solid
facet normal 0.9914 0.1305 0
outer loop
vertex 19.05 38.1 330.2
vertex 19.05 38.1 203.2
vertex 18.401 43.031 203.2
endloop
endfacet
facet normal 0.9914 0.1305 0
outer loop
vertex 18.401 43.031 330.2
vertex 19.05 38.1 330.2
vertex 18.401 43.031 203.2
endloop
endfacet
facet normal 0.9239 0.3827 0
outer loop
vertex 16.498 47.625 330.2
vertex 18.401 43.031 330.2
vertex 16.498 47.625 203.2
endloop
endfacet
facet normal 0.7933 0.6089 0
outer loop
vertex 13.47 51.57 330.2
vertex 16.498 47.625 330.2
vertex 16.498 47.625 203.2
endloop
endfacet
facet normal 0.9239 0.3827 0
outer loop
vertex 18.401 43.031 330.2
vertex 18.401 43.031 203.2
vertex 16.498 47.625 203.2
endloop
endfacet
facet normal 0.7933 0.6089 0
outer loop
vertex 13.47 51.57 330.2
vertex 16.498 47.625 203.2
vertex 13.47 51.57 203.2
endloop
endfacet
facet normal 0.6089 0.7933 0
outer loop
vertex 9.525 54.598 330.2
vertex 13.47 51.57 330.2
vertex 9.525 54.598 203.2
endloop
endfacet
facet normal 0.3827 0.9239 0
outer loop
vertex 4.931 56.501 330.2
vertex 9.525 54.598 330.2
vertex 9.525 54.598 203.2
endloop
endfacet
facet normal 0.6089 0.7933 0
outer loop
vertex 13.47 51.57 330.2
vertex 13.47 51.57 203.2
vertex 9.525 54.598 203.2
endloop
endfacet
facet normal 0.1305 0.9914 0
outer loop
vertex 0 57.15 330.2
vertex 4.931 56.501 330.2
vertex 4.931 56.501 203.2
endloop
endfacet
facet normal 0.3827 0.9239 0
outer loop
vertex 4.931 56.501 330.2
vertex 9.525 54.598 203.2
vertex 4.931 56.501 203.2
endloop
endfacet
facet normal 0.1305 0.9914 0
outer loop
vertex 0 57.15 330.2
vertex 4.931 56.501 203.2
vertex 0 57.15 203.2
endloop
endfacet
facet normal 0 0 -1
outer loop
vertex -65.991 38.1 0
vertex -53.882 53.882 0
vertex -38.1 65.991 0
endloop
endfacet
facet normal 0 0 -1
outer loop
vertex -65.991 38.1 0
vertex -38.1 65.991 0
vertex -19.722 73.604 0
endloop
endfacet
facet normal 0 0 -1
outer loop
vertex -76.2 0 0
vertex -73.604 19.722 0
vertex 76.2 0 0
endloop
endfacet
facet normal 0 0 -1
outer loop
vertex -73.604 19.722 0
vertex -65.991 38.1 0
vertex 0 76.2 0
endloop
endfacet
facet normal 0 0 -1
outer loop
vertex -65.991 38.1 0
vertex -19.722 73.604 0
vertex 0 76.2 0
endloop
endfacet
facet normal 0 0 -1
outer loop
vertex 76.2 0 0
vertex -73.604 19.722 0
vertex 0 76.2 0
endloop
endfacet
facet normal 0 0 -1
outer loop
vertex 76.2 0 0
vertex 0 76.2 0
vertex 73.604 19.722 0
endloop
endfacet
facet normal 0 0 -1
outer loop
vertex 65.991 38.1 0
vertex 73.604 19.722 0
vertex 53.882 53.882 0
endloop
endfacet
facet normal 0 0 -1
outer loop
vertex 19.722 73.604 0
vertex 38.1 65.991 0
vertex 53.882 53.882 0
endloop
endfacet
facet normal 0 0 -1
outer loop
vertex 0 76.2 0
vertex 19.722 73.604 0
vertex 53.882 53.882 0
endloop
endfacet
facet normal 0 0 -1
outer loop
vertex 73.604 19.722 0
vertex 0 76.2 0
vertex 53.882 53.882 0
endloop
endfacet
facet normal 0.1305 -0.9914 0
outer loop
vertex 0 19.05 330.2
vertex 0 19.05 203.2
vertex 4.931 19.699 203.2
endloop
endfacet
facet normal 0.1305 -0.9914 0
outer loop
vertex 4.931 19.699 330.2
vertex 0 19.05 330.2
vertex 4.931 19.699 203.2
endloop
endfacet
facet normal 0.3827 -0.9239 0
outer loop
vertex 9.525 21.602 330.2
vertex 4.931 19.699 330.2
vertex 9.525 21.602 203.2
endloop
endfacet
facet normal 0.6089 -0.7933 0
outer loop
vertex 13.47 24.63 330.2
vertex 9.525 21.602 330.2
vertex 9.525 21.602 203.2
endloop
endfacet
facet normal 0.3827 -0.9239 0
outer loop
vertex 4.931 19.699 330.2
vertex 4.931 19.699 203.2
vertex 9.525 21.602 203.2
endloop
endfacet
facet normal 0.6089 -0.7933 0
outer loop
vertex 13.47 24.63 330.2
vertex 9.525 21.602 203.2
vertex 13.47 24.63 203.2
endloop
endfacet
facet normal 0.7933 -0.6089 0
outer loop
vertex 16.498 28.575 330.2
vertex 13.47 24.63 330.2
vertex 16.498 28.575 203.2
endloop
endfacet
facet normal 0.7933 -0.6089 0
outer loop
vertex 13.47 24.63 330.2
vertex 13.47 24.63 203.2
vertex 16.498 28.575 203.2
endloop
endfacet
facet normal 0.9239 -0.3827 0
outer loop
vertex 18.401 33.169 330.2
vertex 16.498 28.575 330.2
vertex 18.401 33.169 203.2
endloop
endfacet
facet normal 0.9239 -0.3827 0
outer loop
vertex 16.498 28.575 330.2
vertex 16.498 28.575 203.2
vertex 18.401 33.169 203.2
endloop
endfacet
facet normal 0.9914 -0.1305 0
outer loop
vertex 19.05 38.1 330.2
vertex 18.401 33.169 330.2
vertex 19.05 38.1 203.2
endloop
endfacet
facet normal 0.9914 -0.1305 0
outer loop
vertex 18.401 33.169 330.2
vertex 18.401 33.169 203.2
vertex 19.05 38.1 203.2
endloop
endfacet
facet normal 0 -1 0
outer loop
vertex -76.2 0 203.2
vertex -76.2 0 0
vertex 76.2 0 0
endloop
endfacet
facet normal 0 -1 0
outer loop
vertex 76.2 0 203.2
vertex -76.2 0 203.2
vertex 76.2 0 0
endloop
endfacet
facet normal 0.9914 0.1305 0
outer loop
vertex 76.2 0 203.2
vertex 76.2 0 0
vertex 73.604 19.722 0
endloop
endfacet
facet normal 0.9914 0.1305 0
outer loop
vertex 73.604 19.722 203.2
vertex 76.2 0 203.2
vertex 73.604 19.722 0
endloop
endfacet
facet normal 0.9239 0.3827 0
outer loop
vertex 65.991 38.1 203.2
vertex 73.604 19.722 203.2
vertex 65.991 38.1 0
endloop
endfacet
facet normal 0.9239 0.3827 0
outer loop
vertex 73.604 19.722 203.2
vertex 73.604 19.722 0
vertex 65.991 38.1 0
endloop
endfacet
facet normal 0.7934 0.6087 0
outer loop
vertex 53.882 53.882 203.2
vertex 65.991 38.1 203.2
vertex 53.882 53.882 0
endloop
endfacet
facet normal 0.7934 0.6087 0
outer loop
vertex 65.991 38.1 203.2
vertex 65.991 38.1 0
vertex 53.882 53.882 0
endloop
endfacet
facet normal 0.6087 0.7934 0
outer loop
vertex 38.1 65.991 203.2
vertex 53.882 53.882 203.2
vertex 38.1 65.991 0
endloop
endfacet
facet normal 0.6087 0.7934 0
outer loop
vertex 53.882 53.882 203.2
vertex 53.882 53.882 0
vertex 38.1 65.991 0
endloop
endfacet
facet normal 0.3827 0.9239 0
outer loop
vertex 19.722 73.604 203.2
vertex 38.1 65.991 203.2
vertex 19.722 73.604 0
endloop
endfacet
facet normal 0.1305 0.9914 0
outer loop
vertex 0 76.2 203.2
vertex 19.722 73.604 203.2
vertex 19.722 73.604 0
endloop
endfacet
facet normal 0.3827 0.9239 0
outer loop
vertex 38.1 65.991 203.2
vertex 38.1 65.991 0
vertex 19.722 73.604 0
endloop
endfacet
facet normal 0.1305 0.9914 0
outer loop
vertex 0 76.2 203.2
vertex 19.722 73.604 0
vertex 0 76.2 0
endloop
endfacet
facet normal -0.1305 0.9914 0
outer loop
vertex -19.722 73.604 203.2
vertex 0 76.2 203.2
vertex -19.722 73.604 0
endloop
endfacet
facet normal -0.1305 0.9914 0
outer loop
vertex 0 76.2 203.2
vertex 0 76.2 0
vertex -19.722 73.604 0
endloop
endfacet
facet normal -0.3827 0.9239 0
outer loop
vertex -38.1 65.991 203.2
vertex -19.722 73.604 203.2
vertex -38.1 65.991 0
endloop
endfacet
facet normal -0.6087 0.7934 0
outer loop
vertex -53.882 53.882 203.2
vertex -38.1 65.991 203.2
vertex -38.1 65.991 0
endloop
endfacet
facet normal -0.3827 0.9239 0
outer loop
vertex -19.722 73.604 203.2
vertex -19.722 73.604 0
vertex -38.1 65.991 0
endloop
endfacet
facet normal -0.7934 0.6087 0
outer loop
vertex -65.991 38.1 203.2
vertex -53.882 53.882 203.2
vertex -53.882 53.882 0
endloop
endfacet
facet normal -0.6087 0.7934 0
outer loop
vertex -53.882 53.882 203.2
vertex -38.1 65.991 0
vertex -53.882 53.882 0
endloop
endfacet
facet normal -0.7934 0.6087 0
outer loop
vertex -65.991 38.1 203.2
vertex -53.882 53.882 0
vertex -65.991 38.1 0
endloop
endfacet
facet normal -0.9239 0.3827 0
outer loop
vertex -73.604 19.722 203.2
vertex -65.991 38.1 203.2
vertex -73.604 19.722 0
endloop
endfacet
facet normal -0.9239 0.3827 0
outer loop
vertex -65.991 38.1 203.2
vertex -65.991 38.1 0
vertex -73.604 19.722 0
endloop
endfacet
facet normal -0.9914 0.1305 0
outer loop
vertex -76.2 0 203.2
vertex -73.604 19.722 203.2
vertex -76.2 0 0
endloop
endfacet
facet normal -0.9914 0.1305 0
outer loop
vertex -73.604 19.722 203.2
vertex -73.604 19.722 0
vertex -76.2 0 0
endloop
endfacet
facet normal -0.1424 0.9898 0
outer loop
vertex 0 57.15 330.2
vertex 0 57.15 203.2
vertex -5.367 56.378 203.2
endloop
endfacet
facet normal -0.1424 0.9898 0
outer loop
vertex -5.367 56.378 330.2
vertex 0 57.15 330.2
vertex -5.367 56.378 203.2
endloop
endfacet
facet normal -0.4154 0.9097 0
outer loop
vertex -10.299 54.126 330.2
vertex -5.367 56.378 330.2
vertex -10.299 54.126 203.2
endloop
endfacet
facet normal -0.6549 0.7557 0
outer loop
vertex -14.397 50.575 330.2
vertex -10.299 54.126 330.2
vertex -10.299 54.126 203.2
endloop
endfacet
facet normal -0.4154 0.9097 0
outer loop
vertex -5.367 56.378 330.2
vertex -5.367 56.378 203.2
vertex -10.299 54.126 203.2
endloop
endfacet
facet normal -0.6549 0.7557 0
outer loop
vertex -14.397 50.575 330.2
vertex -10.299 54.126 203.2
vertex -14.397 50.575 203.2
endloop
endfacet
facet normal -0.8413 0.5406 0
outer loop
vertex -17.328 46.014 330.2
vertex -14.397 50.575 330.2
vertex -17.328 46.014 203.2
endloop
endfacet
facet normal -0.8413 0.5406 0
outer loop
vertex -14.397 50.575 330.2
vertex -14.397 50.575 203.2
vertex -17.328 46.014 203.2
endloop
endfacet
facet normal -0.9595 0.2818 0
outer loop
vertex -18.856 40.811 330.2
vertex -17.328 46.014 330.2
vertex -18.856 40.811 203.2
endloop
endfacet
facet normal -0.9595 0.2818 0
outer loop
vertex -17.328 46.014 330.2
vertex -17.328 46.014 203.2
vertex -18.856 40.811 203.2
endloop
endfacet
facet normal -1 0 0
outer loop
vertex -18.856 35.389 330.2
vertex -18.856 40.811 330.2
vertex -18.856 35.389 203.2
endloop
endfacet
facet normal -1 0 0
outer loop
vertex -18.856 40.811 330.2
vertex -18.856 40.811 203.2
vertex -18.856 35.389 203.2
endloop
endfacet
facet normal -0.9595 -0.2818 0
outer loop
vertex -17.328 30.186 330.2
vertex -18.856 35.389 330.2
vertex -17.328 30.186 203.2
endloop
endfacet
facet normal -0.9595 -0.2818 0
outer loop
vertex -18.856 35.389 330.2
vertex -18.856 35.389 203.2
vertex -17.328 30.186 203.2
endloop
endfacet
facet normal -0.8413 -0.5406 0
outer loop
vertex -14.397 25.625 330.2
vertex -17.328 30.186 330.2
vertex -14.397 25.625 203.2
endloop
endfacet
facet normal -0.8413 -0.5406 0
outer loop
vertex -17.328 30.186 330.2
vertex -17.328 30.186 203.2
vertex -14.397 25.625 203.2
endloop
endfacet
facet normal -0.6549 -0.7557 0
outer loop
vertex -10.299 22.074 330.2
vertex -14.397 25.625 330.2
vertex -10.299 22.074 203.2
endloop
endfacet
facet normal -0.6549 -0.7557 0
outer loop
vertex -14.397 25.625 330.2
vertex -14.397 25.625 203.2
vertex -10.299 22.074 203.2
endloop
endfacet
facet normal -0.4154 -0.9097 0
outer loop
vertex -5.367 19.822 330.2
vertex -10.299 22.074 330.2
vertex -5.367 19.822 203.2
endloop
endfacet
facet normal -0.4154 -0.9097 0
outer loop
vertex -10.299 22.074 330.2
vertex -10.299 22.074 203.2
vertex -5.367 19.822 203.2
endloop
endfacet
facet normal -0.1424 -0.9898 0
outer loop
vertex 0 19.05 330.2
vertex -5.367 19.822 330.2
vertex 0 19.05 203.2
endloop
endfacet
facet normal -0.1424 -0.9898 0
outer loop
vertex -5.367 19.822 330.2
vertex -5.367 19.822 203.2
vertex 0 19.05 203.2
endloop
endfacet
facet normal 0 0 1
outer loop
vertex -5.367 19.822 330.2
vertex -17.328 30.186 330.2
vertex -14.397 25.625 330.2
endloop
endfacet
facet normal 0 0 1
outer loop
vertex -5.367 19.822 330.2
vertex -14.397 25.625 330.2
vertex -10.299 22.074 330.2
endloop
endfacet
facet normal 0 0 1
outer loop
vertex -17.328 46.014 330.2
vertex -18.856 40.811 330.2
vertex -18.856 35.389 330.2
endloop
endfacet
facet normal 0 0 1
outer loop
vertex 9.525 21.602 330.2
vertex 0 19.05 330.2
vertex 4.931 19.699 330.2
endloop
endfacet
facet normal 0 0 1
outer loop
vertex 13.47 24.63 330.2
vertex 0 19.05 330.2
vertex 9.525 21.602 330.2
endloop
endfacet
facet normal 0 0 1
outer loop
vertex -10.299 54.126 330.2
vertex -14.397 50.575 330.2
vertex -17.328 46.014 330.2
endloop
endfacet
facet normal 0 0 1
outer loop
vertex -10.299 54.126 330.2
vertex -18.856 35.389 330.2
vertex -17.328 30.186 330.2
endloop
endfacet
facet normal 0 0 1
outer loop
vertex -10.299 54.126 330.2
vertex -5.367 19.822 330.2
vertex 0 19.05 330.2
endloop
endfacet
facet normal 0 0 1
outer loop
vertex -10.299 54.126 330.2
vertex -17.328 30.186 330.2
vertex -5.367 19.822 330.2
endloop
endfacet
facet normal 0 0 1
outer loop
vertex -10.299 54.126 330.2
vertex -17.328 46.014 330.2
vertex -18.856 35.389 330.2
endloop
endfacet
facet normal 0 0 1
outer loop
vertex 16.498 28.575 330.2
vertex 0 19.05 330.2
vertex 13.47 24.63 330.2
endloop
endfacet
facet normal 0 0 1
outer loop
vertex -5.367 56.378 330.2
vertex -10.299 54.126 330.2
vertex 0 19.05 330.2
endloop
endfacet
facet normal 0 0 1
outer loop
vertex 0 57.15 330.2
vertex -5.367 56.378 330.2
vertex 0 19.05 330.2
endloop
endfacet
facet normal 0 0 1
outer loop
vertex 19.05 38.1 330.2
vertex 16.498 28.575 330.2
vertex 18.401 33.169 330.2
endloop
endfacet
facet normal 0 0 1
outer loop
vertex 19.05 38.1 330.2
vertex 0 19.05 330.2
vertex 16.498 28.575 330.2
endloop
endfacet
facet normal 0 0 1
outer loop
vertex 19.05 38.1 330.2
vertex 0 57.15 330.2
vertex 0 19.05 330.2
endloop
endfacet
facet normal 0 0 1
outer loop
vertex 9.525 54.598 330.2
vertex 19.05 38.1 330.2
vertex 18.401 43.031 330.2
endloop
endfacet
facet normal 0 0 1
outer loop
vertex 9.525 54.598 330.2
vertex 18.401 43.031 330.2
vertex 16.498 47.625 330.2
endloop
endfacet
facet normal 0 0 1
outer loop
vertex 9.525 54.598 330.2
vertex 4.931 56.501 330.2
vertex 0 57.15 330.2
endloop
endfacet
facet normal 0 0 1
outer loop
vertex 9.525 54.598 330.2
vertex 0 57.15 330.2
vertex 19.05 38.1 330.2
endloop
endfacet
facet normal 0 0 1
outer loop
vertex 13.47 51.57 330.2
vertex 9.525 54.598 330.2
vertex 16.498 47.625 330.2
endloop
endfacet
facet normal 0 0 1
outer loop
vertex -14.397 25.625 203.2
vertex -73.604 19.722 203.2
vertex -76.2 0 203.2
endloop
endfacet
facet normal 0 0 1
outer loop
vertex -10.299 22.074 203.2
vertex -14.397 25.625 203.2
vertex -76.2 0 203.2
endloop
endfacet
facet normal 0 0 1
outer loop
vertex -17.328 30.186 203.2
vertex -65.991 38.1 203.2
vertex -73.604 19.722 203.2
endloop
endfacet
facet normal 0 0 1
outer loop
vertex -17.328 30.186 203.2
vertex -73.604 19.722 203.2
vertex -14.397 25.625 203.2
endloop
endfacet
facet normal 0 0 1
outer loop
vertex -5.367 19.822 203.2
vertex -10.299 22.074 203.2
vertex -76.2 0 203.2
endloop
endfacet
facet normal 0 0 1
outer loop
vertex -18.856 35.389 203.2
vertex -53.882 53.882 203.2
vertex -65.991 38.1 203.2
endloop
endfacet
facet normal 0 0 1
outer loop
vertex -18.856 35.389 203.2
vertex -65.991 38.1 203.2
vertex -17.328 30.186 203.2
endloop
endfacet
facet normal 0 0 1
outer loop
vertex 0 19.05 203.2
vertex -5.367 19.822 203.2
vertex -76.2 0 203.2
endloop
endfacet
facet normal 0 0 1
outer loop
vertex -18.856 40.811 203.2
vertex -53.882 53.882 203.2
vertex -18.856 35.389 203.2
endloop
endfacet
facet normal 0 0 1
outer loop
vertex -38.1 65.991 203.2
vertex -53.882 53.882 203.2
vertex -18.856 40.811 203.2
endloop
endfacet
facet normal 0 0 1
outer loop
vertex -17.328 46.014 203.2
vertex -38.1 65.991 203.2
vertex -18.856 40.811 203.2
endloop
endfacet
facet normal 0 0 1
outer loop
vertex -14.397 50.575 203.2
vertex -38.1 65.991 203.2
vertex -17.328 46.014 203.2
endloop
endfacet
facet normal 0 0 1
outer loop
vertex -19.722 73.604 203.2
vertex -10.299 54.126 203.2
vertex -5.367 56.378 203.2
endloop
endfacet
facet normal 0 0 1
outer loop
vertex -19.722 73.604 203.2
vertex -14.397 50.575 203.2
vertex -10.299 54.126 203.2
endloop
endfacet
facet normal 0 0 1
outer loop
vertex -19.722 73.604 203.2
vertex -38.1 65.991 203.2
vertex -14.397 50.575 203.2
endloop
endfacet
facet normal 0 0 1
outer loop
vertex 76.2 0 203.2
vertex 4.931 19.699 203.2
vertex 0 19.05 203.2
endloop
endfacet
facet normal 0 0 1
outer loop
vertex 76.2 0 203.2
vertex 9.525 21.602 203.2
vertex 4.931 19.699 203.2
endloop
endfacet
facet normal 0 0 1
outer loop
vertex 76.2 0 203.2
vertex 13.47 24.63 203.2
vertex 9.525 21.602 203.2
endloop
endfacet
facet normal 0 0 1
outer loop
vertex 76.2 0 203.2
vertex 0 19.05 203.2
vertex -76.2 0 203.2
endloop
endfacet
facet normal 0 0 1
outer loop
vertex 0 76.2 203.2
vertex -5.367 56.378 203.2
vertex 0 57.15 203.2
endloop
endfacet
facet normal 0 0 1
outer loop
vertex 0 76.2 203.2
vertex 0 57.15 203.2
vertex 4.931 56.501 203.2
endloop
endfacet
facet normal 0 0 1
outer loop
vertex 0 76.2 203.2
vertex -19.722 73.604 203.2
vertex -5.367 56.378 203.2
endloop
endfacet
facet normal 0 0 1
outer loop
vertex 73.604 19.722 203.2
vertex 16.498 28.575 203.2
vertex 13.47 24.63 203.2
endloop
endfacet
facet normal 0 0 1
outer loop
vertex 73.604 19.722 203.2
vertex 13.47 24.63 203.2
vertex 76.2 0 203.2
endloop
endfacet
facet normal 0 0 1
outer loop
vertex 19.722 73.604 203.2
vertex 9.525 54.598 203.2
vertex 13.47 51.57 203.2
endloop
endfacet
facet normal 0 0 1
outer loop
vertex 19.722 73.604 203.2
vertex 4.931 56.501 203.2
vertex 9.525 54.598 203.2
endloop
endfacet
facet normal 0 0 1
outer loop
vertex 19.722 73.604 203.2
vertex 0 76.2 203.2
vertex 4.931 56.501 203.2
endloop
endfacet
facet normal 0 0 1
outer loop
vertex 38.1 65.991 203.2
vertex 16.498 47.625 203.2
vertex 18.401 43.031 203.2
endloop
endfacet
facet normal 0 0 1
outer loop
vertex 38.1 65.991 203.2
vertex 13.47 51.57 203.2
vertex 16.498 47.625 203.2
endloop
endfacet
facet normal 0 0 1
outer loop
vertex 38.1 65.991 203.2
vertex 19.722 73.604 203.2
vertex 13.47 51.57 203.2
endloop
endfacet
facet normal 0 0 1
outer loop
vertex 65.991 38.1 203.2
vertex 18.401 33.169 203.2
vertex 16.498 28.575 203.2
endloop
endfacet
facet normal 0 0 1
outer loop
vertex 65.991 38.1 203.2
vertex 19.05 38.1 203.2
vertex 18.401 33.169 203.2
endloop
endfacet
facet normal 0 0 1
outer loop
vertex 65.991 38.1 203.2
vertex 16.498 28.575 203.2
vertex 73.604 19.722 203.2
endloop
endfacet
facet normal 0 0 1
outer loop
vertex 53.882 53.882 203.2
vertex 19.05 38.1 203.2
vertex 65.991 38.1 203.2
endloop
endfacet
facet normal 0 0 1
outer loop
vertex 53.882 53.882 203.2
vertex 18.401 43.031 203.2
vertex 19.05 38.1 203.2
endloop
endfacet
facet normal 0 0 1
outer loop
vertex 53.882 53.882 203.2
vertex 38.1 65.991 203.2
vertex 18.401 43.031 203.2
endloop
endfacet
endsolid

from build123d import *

# Parameters (mm, degrees)
SALIENTE_EXTRUIR1_DEPTH = 203.2
CROQUIS2_R              = 19.05
SALIENTE_EXTRUIR2_DEPTH = 127


with BuildPart() as part:
    # Croquis1 → Saliente-Extruir1 (new body)
    with BuildSketch(Plane.XY):
        with BuildLine():
            Line((0, 0), (76.2, 0))
            ThreePointArc((76.2, 0), (0, 76.2), (-76.2, 0))
            Line((-76.2, 0), (0, 0))
        make_face()
    extrude(amount=SALIENTE_EXTRUIR1_DEPTH)

    # Croquis2 → Saliente-Extruir2 (add)
    with BuildSketch(Plane.XY.offset(203.2)):
        with Locations((0, 38.1)):
            Circle(CROQUIS2_R)
    extrude(amount=SALIENTE_EXTRUIR2_DEPTH)


solid = part.part
